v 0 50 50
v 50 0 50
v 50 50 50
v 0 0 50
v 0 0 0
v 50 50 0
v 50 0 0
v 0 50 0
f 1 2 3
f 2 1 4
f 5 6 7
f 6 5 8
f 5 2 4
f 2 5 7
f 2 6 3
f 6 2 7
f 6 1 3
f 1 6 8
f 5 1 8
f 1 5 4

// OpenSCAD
module cross(width, height, depth, angle) {
  for (i = [0:width/angle - 1]) {
    translate([i * angle, 0, 0]) {
      cube([depth, width, depth]);
    }
  }
}

cross(width = 50, height = 50, depth = 50, angle = 45);
